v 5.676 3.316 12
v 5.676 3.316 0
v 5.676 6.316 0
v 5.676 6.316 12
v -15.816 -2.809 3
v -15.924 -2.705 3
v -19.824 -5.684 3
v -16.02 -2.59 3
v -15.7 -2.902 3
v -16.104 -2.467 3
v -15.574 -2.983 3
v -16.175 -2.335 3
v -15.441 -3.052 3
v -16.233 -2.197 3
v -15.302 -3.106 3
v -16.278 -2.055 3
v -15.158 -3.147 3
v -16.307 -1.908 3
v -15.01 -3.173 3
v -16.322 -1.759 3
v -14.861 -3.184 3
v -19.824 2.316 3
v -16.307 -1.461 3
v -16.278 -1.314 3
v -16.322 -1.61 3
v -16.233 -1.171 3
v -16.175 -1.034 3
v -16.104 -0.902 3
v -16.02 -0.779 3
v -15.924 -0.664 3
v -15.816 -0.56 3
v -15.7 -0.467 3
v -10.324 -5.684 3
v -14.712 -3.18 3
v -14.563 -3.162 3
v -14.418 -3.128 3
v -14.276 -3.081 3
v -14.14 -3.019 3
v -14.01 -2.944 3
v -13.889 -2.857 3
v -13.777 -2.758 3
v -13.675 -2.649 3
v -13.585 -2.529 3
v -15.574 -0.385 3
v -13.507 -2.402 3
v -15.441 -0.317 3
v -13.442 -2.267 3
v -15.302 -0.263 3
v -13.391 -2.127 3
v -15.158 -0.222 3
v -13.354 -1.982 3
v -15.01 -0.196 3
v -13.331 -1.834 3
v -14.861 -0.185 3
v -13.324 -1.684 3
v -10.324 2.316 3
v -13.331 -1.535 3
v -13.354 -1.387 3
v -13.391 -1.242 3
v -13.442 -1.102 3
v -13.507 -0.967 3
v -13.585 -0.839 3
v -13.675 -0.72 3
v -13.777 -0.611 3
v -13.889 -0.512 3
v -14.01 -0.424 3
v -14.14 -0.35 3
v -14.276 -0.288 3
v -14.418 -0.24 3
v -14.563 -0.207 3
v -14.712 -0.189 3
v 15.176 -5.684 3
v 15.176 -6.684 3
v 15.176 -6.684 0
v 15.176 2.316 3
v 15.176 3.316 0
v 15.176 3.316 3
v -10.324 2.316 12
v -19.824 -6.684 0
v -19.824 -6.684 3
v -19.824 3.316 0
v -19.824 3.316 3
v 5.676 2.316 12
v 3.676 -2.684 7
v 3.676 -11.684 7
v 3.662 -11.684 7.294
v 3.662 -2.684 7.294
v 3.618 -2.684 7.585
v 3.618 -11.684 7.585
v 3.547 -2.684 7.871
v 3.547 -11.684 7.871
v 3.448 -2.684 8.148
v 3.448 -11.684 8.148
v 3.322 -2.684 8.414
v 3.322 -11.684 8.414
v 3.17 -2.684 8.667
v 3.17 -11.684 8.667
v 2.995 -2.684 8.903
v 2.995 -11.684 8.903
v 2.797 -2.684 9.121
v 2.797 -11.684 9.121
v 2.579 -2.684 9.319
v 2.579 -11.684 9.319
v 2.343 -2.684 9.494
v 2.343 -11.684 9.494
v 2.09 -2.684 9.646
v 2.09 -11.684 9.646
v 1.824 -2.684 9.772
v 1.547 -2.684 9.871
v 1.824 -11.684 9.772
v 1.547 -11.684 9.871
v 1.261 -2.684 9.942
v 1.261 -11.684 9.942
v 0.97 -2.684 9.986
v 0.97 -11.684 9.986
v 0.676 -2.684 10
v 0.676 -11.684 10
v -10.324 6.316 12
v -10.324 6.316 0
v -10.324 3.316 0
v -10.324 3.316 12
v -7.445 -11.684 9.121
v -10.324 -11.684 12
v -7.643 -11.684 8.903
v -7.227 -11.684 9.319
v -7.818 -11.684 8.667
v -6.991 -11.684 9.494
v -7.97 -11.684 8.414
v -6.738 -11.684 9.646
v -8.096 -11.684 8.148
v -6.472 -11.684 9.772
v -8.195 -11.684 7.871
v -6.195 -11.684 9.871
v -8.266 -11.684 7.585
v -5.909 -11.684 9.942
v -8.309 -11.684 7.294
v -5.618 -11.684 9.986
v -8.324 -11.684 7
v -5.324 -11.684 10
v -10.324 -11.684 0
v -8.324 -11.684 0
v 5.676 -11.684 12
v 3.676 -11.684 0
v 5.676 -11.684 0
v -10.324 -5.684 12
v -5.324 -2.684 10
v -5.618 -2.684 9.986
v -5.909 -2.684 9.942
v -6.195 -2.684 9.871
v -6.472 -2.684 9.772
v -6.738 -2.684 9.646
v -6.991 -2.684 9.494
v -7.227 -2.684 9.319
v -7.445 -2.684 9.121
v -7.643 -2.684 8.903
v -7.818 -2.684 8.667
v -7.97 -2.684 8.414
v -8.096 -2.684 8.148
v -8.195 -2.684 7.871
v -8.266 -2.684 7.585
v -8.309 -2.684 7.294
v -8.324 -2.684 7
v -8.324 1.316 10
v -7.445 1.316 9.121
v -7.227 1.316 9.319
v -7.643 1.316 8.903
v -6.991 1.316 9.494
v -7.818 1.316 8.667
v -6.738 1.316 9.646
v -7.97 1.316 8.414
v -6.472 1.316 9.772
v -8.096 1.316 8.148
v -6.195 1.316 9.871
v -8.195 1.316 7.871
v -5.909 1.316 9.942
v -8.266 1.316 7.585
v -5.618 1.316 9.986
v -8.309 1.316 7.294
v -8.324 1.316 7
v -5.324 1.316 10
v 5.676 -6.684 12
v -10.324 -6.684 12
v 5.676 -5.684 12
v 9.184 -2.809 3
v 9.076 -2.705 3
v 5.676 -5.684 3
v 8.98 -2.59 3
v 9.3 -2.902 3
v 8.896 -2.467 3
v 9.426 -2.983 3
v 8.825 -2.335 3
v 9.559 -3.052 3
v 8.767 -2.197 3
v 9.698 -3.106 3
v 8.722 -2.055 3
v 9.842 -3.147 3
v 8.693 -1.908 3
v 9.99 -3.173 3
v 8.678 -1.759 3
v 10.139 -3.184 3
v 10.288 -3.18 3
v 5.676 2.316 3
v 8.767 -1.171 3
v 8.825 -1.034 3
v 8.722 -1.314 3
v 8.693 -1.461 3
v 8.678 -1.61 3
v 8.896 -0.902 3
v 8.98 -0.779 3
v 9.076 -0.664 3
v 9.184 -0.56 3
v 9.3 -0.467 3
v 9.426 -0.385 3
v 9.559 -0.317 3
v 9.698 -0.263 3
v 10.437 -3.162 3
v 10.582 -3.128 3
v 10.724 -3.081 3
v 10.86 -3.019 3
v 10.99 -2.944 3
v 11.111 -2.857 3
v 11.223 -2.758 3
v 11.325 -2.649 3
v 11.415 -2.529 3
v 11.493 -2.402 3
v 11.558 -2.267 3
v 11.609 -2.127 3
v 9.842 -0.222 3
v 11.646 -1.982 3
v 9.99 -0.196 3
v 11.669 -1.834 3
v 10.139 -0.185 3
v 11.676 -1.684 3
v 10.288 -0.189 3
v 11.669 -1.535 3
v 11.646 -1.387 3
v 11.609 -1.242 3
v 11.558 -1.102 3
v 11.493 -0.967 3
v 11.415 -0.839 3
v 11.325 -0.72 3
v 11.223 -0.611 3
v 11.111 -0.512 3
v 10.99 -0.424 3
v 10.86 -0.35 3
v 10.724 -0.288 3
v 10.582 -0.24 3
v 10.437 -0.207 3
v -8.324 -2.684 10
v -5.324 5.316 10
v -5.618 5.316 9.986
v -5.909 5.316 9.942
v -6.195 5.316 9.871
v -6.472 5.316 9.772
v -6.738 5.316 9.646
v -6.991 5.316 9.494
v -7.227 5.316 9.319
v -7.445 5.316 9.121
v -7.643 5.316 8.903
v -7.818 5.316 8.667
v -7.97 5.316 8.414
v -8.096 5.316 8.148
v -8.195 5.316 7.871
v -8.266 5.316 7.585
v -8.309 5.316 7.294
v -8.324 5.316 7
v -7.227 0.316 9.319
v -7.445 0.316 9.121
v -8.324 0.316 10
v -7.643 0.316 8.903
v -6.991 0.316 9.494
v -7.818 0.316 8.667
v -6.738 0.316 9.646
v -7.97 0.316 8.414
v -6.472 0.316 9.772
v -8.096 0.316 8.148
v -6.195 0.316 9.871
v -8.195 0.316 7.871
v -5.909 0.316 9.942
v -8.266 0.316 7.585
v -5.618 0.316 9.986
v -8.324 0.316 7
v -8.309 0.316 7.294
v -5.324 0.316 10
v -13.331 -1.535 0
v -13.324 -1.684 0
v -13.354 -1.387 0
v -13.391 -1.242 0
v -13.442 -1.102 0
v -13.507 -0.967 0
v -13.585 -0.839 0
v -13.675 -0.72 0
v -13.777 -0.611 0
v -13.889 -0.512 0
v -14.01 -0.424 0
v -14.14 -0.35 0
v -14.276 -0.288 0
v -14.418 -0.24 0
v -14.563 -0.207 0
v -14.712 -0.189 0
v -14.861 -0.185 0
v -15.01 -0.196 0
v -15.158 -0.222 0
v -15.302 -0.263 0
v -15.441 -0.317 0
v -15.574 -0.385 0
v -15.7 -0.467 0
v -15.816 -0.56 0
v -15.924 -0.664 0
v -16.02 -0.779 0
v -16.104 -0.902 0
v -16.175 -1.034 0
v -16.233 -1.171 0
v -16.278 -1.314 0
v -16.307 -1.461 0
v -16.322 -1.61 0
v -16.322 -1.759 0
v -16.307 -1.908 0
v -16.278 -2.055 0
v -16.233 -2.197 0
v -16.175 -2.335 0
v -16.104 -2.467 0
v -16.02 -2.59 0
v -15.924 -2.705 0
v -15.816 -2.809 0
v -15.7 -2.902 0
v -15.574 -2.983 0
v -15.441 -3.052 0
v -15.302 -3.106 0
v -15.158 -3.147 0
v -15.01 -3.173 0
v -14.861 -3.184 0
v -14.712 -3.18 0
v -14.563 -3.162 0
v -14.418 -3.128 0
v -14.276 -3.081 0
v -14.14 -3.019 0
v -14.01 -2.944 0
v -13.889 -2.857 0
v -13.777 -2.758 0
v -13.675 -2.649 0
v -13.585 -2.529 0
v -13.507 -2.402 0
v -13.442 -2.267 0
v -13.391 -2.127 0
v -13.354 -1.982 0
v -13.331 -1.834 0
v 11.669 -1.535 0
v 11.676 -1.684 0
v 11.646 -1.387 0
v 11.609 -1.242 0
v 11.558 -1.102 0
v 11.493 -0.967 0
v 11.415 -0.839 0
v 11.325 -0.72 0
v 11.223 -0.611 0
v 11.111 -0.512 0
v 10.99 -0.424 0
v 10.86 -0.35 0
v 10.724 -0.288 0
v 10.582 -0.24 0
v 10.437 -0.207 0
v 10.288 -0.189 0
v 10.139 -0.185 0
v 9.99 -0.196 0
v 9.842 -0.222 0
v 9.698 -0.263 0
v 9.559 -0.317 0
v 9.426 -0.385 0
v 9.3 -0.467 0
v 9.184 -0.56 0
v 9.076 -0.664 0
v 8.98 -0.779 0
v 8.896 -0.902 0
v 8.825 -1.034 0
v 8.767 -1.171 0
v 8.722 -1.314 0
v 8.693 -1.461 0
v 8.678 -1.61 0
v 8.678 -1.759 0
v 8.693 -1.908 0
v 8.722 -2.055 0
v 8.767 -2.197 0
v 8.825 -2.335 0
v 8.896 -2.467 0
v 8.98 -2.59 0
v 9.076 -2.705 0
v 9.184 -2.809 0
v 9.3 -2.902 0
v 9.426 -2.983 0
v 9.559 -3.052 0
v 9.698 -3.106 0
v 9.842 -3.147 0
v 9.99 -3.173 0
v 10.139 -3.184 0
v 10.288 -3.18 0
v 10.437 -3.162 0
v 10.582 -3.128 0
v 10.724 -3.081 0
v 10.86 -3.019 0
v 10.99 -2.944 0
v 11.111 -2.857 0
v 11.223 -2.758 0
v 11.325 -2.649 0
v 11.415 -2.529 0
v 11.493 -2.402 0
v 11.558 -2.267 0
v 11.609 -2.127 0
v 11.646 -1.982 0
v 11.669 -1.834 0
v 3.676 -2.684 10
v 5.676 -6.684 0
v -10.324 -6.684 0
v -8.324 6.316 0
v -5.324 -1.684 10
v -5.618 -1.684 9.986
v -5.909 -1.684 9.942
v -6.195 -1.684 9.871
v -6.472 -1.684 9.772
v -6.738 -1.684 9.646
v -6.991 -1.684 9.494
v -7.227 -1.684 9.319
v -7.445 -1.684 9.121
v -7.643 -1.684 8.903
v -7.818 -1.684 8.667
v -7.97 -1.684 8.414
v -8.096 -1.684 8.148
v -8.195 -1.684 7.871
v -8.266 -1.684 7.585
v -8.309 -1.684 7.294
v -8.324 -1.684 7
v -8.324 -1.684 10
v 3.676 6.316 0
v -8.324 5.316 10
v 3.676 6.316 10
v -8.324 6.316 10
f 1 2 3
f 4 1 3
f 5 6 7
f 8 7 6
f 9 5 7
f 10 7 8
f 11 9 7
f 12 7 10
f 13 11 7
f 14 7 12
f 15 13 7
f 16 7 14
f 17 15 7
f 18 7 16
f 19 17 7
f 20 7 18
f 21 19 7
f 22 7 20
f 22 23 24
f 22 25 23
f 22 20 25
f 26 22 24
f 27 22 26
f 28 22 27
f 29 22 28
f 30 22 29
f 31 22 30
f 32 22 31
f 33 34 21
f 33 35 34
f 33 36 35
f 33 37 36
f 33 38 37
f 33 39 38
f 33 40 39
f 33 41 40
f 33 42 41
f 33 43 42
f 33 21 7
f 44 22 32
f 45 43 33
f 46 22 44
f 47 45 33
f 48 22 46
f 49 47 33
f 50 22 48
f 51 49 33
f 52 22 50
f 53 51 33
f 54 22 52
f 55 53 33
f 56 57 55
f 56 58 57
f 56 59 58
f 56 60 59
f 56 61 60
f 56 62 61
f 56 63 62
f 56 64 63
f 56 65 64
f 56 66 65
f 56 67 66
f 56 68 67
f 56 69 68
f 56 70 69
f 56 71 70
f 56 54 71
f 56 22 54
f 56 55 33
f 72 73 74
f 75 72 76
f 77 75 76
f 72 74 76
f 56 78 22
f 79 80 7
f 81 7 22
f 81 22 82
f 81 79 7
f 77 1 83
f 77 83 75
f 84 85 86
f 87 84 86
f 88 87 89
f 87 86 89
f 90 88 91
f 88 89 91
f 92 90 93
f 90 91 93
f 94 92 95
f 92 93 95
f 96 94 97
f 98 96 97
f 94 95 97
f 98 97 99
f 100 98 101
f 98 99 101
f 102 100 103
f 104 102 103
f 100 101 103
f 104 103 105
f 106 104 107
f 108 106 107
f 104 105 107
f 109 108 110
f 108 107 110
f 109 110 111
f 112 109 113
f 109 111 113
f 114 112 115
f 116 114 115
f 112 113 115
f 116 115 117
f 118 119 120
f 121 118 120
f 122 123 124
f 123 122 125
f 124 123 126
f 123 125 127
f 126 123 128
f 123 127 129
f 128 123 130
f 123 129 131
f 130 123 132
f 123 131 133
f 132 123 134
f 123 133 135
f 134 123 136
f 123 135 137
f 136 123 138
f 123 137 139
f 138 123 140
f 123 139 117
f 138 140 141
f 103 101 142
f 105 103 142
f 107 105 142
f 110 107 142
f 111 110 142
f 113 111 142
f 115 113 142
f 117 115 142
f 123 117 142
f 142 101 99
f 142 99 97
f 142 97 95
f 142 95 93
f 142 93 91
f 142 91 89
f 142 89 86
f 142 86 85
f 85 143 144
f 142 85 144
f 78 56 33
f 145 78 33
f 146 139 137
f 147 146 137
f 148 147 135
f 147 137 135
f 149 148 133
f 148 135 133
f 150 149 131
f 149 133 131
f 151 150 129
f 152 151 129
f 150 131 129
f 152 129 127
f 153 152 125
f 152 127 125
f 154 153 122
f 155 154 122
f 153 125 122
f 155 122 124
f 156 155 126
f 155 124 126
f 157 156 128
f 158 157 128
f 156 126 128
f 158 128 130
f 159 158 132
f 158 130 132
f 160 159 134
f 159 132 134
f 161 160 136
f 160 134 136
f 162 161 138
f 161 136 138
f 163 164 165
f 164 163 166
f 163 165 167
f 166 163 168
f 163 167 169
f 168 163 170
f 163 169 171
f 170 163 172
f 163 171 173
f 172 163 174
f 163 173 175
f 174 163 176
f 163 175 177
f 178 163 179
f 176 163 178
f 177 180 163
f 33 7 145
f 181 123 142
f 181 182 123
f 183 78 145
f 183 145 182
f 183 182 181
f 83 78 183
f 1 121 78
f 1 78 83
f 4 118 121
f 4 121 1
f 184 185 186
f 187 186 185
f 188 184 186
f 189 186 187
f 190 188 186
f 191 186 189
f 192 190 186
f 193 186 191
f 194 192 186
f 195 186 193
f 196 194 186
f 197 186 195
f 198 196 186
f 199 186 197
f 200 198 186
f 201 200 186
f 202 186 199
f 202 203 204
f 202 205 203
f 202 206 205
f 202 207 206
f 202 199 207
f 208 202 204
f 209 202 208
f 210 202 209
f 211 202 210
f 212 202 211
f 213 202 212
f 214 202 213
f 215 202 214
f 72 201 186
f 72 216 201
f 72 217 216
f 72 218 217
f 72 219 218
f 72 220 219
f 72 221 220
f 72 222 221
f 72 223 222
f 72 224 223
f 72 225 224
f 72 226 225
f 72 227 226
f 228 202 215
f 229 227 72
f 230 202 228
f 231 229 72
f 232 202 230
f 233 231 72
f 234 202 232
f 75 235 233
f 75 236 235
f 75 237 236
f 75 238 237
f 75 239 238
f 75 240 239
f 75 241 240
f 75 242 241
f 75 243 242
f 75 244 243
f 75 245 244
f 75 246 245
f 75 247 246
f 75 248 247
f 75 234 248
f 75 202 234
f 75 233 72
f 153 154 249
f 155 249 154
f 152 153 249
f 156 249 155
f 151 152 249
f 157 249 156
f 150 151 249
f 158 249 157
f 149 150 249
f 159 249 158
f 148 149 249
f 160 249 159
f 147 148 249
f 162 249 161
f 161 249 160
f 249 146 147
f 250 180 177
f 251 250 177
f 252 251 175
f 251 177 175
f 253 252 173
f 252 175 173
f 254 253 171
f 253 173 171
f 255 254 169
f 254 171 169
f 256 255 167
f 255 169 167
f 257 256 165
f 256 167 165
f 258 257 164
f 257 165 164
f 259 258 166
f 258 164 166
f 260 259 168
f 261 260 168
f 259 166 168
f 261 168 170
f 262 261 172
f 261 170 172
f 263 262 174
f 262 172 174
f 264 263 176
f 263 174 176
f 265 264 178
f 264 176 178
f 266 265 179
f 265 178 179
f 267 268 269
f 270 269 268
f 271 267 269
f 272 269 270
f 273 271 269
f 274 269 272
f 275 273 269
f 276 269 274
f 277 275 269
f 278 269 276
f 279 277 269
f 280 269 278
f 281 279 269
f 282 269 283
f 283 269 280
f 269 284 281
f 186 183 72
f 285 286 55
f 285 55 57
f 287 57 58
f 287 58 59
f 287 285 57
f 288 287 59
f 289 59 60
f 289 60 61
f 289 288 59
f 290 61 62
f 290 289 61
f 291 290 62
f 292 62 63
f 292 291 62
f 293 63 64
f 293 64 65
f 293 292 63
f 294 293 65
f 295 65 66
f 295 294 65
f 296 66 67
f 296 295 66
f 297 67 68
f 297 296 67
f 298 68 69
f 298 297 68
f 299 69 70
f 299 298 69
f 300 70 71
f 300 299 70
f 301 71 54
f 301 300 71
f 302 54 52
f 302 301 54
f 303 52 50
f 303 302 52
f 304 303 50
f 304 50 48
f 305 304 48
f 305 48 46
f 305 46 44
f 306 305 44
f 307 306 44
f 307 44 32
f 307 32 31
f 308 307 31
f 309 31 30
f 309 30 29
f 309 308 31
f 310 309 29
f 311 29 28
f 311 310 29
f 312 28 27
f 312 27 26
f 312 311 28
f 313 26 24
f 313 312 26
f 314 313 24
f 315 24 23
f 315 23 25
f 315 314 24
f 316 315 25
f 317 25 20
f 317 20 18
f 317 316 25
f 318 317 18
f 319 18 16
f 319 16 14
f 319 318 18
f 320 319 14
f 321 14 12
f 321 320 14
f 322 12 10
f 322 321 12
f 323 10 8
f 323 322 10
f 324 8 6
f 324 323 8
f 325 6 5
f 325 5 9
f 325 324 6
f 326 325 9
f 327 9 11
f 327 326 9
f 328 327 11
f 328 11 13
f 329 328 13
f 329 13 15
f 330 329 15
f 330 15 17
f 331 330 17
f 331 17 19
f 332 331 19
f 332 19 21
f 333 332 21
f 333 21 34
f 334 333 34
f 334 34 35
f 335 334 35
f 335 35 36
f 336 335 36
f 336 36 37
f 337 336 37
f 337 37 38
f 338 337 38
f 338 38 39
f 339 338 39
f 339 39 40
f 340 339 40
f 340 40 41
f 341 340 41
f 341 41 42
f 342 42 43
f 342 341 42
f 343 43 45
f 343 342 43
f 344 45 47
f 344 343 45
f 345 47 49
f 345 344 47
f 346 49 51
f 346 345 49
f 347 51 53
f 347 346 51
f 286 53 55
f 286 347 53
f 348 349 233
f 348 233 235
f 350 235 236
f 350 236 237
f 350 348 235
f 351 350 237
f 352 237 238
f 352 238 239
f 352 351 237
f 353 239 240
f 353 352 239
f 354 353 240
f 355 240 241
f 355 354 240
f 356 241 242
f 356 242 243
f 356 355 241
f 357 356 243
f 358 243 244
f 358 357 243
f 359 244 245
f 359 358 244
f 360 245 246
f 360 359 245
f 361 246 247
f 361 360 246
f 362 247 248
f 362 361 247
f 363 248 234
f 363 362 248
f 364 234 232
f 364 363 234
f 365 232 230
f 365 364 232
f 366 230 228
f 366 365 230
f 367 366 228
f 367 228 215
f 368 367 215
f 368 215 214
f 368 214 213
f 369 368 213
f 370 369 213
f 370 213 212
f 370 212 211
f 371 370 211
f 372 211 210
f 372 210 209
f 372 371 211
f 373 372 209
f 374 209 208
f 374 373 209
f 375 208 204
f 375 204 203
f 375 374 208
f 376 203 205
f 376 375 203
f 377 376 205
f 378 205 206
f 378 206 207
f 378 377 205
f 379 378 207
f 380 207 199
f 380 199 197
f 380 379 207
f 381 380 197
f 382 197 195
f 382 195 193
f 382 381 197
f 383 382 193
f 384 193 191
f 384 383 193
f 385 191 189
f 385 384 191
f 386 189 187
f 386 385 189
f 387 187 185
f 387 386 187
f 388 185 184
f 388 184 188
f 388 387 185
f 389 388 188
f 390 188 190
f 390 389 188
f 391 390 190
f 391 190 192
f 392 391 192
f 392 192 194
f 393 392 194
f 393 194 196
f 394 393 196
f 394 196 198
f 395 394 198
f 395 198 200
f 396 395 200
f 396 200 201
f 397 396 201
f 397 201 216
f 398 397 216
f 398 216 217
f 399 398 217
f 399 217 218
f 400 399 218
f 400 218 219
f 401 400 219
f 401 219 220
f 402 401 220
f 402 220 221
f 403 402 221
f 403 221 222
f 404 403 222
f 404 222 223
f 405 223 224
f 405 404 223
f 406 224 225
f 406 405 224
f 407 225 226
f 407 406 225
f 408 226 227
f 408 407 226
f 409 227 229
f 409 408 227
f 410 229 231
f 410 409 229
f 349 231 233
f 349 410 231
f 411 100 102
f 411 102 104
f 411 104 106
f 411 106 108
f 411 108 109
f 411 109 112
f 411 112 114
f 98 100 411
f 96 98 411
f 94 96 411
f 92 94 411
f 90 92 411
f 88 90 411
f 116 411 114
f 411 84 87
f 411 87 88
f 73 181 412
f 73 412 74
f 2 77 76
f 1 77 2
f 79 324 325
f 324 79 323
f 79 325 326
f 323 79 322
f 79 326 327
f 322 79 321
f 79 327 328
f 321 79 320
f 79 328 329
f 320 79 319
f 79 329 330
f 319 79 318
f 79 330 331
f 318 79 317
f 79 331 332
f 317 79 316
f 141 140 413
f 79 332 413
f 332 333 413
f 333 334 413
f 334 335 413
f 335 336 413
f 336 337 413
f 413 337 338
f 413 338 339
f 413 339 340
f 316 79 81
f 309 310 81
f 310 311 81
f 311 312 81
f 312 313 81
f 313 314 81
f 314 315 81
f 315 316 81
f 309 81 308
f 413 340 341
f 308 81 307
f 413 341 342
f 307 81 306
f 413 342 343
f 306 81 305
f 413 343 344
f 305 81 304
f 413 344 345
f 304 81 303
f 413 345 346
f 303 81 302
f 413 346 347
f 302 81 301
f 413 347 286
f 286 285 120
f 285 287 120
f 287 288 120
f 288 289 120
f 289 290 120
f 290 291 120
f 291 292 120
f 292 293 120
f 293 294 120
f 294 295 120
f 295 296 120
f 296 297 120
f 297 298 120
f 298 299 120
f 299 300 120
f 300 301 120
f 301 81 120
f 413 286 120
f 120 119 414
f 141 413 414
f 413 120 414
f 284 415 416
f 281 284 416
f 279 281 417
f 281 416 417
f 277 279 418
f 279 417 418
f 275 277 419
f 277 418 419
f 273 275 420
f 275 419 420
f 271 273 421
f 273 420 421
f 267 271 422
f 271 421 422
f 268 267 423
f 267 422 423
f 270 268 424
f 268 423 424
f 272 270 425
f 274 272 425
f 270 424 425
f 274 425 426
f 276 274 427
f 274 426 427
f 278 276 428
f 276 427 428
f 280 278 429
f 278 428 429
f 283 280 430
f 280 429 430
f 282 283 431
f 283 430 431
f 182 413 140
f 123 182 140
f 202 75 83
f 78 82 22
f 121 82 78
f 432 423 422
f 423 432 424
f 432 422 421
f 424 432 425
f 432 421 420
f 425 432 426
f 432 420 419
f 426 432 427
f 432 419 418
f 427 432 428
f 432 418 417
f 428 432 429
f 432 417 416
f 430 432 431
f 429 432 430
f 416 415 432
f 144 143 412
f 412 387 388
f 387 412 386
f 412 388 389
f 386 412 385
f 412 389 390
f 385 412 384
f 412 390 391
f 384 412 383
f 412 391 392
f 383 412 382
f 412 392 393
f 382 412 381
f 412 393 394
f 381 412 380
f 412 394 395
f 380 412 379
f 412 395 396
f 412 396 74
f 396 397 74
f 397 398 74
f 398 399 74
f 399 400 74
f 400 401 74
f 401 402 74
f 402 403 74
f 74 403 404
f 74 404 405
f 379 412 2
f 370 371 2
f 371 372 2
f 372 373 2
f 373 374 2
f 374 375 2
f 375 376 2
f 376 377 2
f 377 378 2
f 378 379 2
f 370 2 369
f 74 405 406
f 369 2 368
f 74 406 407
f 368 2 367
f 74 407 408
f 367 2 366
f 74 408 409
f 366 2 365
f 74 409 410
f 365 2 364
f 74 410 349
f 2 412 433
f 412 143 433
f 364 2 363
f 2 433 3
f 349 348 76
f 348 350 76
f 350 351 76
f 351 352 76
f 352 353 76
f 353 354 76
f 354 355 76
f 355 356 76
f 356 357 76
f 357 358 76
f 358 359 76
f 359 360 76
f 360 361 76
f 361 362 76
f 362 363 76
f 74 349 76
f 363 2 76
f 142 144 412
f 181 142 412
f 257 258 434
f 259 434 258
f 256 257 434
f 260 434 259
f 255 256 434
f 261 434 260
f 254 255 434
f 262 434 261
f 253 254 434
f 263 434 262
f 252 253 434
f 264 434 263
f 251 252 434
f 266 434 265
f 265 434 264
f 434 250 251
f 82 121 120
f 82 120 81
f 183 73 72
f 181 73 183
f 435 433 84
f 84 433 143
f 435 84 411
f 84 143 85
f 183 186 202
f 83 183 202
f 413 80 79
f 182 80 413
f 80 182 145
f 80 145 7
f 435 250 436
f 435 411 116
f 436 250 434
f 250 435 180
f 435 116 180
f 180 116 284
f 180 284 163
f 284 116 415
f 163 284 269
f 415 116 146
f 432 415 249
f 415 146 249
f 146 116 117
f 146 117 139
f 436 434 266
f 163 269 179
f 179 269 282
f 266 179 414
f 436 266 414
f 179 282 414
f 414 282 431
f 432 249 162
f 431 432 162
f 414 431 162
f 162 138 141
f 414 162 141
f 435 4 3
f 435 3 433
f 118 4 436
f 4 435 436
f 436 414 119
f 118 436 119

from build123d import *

# Parameters (mm, degrees)
F0_W      = 16
F0_H      = 3
F0_H_2    = 10
F0_W_2    = 9.5
F0_R      = 1.5
F0_H_3    = 5
F1_DEPTH  = 3
F3_DEPTH  = 9
F5_DEPTH  = 18.001
F7_DEPTH  = 1
F9_DEPTH  = 1
F11_DEPTH = 1
F13_DEPTH = 1
F14_W     = 3
F14_H     = 1
F14_H_2   = 9
F15_DEPTH = 10


with BuildPart() as f1:
    # F0 (on Top) → F1 (new body)
    with BuildSketch(Plane.XY):
        with Locations((-2.323942259, 4.8155895834)):
            Rectangle(F0_W, F0_H)
        with Locations((-2.323942259, -1.6844104166)):
            Rectangle(F0_W, F0_H_2)
        with Locations((-15.073942259, -1.6844104166)):
            Rectangle(F0_W_2, F0_H_2)
        with Locations((-14.823942259, -1.6844104166)):
            Circle(F0_R, mode=Mode.SUBTRACT)
        with Locations((-2.323942259, -9.1844104166)):
            Rectangle(F0_W, F0_H_3)
        with Locations((10.426057741, -1.6844104166)):
            Rectangle(F0_W_2, F0_H_2)
        with Locations((10.176057741, -1.6844104166)):
            Circle(F0_R, mode=Mode.SUBTRACT)
    extrude(amount=F1_DEPTH)

    # F2 (on face) → F3 (join)
    with BuildSketch(Plane.XY.offset(3)):
        Polygon((-10.323942259, -6.6844104166), (-10.323942259, -11.6844104166), (5.676057741, -11.6844104166), (5.676057741, -6.6844104166), (5.676057741, 3.3155895834), (5.676057741, 6.3155895834), (-10.323942259, 6.3155895834), (-10.323942259, 3.3155895834), align=None)
    extrude(amount=F3_DEPTH)

    # F4 (on face) → F5 (cut, through all)
    with BuildSketch(Plane.XZ.offset(11.6844104166)):
        with BuildLine():
            ThreePointArc((-5.323942259, 10), (-7.4452626025, 9.1213203436), (-8.323942259, 7))
            ThreePointArc((-8.323942259, 7), (-5.323942259, 4), (-2.323942259, 7))
            ThreePointArc((-2.323942259, 7), (-3.2026219154, 9.1213203436), (-5.323942259, 10))
        make_face()
        with BuildLine():
            Line((0.6760577337, 10), (-5.323942259, 10))
            ThreePointArc((-5.323942259, 10), (-3.2026219154, 9.1213203436), (-2.323942259, 7))
            ThreePointArc((-2.323942259, 7), (-1.4452626051, 9.121320341), (0.6760577337, 10))
        make_face()
        with BuildLine():
            ThreePointArc((-2.323942259, 7), (0.676057741, 4), (3.676057741, 7))
            ThreePointArc((3.676057741, 7), (2.797378082, 9.1213203461), (0.6760577337, 10))
            ThreePointArc((0.6760577337, 10), (-1.4452626051, 9.121320341), (-2.323942259, 7))
        make_face()
        with BuildLine():
            Line((-8.323942259, 7), (-8.323942259, 0))
            Line((-8.323942259, 0), (3.676057741, 0))
            Line((3.676057741, 0), (3.676057741, 7))
            ThreePointArc((3.676057741, 7), (0.676057741, 4), (-2.323942259, 7))
            ThreePointArc((-2.323942259, 7), (-5.323942259, 4), (-8.323942259, 7))
        make_face()
    extrude(amount=-F5_DEPTH, mode=Mode.SUBTRACT)

    # F6 (on face) → F7 (join)
    with BuildSketch(Plane.XZ.offset(6.6844104166)):
        Polygon((-10.323942259, 12), (-19.823942259, 3), (-10.323942259, 3), align=None)
    extrude(amount=-F7_DEPTH)

    # F8 (on face) → F9 (join)
    with BuildSketch(Plane(origin=(0, 3.3155895834, 0), x_dir=(-1, 0, 0), z_dir=(0, 1, 0))):
        Polygon((10.323942259, 3), (19.823942259, 3), (10.323942259, 12), align=None)
    extrude(amount=-F9_DEPTH)

    # F10 (on face) → F11 (join)
    with BuildSketch(Plane(origin=(0, 3.3155895834, 0), x_dir=(-1, 0, 0), z_dir=(0, 1, 0))):
        Polygon((-5.676057741, 12), (-15.176057741, 3), (-5.676057741, 3), align=None)
    extrude(amount=-F11_DEPTH)

    # F12 (on face) → F13 (join)
    with BuildSketch(Plane.XZ.offset(6.6844104166)):
        Polygon((5.676057741, 3), (15.176057741, 3), (5.676057741, 12), align=None)
    extrude(amount=-F13_DEPTH)

    # F14 (on face) → F15 (cut)
    with BuildSketch(Plane(origin=(0, 0, 0), x_dir=(1, 0, 0), z_dir=(0, 0, -1))):
        with Locations((-6.823942259, -0.8155895834)):
            Rectangle(F14_W, F14_H)
        with Locations((-6.823942259, -5.8155895834)):
            Rectangle(F14_W, F14_H)
        with Locations((2.176057741, -1.8155895834)):
            Rectangle(F14_W, F14_H_2)
        with Locations((-6.823942259, 2.1844104166)):
            Rectangle(F14_W, F14_H)
    extrude(amount=-F15_DEPTH, mode=Mode.SUBTRACT)


solid = f1.part
